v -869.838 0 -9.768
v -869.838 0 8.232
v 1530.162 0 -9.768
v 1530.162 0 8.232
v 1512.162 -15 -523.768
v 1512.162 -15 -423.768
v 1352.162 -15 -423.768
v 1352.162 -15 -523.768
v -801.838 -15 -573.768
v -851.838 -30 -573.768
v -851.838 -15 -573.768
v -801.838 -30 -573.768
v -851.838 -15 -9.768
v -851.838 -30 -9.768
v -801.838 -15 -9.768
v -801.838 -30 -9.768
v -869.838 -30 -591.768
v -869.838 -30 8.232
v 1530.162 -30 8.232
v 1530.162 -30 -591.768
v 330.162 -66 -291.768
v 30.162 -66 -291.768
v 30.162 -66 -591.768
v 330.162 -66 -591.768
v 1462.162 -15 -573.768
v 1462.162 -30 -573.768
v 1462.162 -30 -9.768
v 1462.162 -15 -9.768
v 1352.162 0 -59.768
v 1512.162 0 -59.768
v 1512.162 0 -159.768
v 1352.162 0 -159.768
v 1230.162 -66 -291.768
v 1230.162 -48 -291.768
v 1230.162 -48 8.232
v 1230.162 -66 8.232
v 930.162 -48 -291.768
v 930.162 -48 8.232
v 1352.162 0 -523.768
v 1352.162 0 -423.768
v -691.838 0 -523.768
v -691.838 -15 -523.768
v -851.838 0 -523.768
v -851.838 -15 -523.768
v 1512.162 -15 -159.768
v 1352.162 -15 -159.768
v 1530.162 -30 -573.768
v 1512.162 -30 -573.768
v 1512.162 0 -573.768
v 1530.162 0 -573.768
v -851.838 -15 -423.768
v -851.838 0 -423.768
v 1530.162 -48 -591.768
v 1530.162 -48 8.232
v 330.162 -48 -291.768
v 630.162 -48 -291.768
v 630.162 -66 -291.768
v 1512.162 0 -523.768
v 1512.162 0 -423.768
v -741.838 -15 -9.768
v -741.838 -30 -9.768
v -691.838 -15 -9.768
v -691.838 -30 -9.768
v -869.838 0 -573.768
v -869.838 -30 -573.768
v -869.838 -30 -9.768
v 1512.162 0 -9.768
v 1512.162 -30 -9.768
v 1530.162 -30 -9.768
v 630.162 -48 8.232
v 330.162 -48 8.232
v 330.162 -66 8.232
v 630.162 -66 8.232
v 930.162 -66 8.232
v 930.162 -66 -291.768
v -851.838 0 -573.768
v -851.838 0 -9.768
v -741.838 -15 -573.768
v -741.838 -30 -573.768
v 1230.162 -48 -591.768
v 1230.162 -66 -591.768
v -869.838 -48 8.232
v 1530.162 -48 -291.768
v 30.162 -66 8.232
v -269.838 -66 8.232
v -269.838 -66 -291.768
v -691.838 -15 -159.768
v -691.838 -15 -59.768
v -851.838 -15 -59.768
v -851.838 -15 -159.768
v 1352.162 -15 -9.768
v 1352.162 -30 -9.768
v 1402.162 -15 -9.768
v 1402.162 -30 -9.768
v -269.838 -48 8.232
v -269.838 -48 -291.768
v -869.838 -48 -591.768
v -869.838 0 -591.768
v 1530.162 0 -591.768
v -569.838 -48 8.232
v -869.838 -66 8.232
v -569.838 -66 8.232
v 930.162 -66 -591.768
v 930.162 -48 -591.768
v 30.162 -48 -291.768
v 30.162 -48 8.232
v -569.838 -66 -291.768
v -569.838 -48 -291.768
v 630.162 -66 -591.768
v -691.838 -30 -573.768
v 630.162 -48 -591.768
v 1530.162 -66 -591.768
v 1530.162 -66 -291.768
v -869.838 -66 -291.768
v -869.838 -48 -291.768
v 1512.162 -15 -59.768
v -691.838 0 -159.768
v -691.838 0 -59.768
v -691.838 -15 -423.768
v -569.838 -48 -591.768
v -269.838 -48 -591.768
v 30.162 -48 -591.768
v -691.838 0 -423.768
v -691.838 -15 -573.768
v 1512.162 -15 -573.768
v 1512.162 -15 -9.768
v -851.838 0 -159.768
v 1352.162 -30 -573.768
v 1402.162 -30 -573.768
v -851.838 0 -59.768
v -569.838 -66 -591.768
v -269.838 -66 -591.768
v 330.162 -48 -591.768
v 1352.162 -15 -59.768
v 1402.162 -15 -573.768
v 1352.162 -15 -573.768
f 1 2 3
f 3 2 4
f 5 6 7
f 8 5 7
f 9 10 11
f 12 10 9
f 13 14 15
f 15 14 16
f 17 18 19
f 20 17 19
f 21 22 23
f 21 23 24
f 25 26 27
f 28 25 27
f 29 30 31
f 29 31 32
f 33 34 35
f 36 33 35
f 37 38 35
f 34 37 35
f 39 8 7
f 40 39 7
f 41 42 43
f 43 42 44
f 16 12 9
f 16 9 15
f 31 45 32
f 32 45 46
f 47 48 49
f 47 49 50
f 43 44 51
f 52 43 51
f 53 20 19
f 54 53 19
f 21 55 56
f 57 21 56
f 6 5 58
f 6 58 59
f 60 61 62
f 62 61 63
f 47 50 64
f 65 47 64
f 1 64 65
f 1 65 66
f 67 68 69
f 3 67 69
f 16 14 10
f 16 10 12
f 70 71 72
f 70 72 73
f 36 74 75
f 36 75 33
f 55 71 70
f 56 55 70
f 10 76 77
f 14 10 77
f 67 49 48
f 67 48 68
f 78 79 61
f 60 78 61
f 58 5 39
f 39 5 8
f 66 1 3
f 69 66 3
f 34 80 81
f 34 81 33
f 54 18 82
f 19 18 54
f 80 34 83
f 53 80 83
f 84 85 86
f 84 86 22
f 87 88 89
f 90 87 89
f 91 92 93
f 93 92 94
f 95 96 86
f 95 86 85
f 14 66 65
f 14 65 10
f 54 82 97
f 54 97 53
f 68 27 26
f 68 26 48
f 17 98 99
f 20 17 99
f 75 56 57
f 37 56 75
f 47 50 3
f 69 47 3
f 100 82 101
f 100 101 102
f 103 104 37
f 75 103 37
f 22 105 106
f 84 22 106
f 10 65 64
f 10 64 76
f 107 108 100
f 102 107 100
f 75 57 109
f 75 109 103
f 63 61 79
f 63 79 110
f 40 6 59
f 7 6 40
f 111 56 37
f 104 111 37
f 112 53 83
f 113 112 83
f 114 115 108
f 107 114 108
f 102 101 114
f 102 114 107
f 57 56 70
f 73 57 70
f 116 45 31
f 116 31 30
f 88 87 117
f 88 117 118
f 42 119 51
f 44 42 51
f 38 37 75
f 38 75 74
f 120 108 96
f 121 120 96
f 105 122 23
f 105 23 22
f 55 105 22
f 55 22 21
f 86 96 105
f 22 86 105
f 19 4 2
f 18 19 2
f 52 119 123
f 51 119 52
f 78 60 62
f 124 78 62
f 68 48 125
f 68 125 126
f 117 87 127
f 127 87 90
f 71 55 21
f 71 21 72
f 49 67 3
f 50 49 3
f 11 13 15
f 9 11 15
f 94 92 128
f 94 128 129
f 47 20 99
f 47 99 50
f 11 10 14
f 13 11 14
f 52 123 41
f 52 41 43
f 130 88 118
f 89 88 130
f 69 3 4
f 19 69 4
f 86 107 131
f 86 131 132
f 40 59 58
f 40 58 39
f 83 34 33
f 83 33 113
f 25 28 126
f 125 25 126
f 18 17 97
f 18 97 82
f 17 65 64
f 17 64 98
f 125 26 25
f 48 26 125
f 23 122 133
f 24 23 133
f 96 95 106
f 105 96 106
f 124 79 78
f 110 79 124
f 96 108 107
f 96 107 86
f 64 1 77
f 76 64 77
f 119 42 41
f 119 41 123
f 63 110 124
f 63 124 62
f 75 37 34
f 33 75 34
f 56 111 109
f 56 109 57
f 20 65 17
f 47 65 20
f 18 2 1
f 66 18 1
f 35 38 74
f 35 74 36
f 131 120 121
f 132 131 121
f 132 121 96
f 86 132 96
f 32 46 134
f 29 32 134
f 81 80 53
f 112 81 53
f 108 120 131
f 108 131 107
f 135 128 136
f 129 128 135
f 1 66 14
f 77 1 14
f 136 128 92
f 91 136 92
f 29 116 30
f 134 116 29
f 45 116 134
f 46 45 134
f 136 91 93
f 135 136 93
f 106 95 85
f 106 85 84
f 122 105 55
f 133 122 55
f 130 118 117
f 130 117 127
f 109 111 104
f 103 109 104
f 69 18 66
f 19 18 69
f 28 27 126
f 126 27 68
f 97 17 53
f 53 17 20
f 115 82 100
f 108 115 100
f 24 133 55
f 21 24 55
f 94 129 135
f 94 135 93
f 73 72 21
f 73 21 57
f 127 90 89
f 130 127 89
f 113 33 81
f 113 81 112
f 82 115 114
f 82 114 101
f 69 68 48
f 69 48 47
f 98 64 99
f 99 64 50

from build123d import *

# Parameters (mm, degrees)
F0_W      = 18
F0_H      = 564
F1_DEPTH  = 30
F2_DEPTH  = 30
F3_DEPTH  = 30
F4_DEPTH  = 30
F5_W      = 2400
F5_H      = 600
F6_DEPTH  = 18
F7_W      = 300
F7_H      = 300
F8_DEPTH  = 18
F9_W      = 50
F9_H      = 564
F10_DEPTH = 15
F11_W     = 160
F11_H     = 100
F12_DEPTH = 15


with BuildPart() as f1:
    # F0 (on Front) → F1 (new body)
    with BuildSketch(Plane.XZ):
        with Locations((1521.161786, -291.767616)):
            Rectangle(F0_W, F0_H)
    extrude(amount=F1_DEPTH)


with BuildPart() as f2:
    # F0 (on Front) → F2 (new body)
    with BuildSketch(Plane.XZ):
        Polygon((1530.161786, 8.232384), (-869.838214, 8.232384), (-869.838214, -9.767616), (-851.838214, -9.767616), (1512.161786, -9.767616), (1530.161786, -9.767616), align=None)
    extrude(amount=F2_DEPTH)


with BuildPart() as f3:
    # F0 (on Front) → F3 (new body)
    with BuildSketch(Plane.XZ):
        with Locations((-860.838214, -291.767616)):
            Rectangle(F0_W, F0_H)
    extrude(amount=F3_DEPTH)


with BuildPart() as f4:
    # F0 (on Front) → F4 (new body)
    with BuildSketch(Plane.XZ):
        Polygon((-851.838214, -573.767616), (-869.838214, -573.767616), (-869.838214, -591.767616), (-50, -591.767616), (50, -591.767616), (1530.161786, -591.767616), (1530.161786, -573.767616), (1512.161786, -573.767616), (50, -573.767616), (-50, -573.767616), align=None)
    extrude(amount=F4_DEPTH)


with BuildPart() as f6:
    # F5 (on face) → F6 (new body)
    with BuildSketch(Plane.XZ.offset(30)):
        with Locations((330.161786, -291.767616)):
            Rectangle(F5_W, F5_H)
    extrude(amount=F6_DEPTH)


with BuildPart() as f8:
    # F7 (on face) → F8 (new body)
    with BuildSketch(Plane.XZ.offset(48)):
        with Locations((1380.161786, -441.767616)):
            Rectangle(F7_W, F7_H)
        with Locations((1080.161786, -141.767616)):
            Rectangle(F7_W, F7_H)
        with Locations((780.161786, -441.767616)):
            Rectangle(F7_W, F7_H)
        with Locations((480.161786, -141.767616)):
            Rectangle(F7_W, F7_H)
        with Locations((180.161786, -441.767616)):
            Rectangle(F7_W, F7_H)
        with Locations((-119.838214, -141.767616)):
            Rectangle(F7_W, F7_H)
        with Locations((-419.838214, -441.767616)):
            Rectangle(F7_W, F7_H)
        with Locations((-719.838214, -141.767616)):
            Rectangle(F7_W, F7_H)
    extrude(amount=F8_DEPTH)


with BuildPart() as f10:
    # F9 (on face) → F10 (new body)
    with BuildSketch(Plane.XZ.offset(30)):
        with Locations((1487.161786, -291.767616)):
            Rectangle(F9_W, F9_H)
        with Locations((-826.838214, -291.767616)):
            Rectangle(F9_W, F9_H)
        with Locations((1377.161786, -291.767616)):
            Rectangle(F9_W, F9_H)
        with Locations((-716.838214, -291.767616)):
            Rectangle(F9_W, F9_H)
    extrude(amount=-F10_DEPTH)


with BuildPart() as f12:
    # F11 (on face) → F12 (new body)
    with BuildSketch(Plane(origin=(0, -15, 0), x_dir=(-1, 0, 0), z_dir=(0, 1, 0))):
        with Locations((-1432.161786, -109.767616)):
            Rectangle(F11_W, F11_H)
        with Locations((771.838214, -109.767616)):
            Rectangle(F11_W, F11_H)
        with Locations((-1432.161786, -473.767616)):
            Rectangle(F11_W, F11_H)
        with Locations((771.838214, -473.767616)):
            Rectangle(F11_W, F11_H)
    extrude(amount=F12_DEPTH)


solid = Compound([f1.part, f2.part, f3.part, f4.part, f6.part, f8.part, f10.part, f12.part])
